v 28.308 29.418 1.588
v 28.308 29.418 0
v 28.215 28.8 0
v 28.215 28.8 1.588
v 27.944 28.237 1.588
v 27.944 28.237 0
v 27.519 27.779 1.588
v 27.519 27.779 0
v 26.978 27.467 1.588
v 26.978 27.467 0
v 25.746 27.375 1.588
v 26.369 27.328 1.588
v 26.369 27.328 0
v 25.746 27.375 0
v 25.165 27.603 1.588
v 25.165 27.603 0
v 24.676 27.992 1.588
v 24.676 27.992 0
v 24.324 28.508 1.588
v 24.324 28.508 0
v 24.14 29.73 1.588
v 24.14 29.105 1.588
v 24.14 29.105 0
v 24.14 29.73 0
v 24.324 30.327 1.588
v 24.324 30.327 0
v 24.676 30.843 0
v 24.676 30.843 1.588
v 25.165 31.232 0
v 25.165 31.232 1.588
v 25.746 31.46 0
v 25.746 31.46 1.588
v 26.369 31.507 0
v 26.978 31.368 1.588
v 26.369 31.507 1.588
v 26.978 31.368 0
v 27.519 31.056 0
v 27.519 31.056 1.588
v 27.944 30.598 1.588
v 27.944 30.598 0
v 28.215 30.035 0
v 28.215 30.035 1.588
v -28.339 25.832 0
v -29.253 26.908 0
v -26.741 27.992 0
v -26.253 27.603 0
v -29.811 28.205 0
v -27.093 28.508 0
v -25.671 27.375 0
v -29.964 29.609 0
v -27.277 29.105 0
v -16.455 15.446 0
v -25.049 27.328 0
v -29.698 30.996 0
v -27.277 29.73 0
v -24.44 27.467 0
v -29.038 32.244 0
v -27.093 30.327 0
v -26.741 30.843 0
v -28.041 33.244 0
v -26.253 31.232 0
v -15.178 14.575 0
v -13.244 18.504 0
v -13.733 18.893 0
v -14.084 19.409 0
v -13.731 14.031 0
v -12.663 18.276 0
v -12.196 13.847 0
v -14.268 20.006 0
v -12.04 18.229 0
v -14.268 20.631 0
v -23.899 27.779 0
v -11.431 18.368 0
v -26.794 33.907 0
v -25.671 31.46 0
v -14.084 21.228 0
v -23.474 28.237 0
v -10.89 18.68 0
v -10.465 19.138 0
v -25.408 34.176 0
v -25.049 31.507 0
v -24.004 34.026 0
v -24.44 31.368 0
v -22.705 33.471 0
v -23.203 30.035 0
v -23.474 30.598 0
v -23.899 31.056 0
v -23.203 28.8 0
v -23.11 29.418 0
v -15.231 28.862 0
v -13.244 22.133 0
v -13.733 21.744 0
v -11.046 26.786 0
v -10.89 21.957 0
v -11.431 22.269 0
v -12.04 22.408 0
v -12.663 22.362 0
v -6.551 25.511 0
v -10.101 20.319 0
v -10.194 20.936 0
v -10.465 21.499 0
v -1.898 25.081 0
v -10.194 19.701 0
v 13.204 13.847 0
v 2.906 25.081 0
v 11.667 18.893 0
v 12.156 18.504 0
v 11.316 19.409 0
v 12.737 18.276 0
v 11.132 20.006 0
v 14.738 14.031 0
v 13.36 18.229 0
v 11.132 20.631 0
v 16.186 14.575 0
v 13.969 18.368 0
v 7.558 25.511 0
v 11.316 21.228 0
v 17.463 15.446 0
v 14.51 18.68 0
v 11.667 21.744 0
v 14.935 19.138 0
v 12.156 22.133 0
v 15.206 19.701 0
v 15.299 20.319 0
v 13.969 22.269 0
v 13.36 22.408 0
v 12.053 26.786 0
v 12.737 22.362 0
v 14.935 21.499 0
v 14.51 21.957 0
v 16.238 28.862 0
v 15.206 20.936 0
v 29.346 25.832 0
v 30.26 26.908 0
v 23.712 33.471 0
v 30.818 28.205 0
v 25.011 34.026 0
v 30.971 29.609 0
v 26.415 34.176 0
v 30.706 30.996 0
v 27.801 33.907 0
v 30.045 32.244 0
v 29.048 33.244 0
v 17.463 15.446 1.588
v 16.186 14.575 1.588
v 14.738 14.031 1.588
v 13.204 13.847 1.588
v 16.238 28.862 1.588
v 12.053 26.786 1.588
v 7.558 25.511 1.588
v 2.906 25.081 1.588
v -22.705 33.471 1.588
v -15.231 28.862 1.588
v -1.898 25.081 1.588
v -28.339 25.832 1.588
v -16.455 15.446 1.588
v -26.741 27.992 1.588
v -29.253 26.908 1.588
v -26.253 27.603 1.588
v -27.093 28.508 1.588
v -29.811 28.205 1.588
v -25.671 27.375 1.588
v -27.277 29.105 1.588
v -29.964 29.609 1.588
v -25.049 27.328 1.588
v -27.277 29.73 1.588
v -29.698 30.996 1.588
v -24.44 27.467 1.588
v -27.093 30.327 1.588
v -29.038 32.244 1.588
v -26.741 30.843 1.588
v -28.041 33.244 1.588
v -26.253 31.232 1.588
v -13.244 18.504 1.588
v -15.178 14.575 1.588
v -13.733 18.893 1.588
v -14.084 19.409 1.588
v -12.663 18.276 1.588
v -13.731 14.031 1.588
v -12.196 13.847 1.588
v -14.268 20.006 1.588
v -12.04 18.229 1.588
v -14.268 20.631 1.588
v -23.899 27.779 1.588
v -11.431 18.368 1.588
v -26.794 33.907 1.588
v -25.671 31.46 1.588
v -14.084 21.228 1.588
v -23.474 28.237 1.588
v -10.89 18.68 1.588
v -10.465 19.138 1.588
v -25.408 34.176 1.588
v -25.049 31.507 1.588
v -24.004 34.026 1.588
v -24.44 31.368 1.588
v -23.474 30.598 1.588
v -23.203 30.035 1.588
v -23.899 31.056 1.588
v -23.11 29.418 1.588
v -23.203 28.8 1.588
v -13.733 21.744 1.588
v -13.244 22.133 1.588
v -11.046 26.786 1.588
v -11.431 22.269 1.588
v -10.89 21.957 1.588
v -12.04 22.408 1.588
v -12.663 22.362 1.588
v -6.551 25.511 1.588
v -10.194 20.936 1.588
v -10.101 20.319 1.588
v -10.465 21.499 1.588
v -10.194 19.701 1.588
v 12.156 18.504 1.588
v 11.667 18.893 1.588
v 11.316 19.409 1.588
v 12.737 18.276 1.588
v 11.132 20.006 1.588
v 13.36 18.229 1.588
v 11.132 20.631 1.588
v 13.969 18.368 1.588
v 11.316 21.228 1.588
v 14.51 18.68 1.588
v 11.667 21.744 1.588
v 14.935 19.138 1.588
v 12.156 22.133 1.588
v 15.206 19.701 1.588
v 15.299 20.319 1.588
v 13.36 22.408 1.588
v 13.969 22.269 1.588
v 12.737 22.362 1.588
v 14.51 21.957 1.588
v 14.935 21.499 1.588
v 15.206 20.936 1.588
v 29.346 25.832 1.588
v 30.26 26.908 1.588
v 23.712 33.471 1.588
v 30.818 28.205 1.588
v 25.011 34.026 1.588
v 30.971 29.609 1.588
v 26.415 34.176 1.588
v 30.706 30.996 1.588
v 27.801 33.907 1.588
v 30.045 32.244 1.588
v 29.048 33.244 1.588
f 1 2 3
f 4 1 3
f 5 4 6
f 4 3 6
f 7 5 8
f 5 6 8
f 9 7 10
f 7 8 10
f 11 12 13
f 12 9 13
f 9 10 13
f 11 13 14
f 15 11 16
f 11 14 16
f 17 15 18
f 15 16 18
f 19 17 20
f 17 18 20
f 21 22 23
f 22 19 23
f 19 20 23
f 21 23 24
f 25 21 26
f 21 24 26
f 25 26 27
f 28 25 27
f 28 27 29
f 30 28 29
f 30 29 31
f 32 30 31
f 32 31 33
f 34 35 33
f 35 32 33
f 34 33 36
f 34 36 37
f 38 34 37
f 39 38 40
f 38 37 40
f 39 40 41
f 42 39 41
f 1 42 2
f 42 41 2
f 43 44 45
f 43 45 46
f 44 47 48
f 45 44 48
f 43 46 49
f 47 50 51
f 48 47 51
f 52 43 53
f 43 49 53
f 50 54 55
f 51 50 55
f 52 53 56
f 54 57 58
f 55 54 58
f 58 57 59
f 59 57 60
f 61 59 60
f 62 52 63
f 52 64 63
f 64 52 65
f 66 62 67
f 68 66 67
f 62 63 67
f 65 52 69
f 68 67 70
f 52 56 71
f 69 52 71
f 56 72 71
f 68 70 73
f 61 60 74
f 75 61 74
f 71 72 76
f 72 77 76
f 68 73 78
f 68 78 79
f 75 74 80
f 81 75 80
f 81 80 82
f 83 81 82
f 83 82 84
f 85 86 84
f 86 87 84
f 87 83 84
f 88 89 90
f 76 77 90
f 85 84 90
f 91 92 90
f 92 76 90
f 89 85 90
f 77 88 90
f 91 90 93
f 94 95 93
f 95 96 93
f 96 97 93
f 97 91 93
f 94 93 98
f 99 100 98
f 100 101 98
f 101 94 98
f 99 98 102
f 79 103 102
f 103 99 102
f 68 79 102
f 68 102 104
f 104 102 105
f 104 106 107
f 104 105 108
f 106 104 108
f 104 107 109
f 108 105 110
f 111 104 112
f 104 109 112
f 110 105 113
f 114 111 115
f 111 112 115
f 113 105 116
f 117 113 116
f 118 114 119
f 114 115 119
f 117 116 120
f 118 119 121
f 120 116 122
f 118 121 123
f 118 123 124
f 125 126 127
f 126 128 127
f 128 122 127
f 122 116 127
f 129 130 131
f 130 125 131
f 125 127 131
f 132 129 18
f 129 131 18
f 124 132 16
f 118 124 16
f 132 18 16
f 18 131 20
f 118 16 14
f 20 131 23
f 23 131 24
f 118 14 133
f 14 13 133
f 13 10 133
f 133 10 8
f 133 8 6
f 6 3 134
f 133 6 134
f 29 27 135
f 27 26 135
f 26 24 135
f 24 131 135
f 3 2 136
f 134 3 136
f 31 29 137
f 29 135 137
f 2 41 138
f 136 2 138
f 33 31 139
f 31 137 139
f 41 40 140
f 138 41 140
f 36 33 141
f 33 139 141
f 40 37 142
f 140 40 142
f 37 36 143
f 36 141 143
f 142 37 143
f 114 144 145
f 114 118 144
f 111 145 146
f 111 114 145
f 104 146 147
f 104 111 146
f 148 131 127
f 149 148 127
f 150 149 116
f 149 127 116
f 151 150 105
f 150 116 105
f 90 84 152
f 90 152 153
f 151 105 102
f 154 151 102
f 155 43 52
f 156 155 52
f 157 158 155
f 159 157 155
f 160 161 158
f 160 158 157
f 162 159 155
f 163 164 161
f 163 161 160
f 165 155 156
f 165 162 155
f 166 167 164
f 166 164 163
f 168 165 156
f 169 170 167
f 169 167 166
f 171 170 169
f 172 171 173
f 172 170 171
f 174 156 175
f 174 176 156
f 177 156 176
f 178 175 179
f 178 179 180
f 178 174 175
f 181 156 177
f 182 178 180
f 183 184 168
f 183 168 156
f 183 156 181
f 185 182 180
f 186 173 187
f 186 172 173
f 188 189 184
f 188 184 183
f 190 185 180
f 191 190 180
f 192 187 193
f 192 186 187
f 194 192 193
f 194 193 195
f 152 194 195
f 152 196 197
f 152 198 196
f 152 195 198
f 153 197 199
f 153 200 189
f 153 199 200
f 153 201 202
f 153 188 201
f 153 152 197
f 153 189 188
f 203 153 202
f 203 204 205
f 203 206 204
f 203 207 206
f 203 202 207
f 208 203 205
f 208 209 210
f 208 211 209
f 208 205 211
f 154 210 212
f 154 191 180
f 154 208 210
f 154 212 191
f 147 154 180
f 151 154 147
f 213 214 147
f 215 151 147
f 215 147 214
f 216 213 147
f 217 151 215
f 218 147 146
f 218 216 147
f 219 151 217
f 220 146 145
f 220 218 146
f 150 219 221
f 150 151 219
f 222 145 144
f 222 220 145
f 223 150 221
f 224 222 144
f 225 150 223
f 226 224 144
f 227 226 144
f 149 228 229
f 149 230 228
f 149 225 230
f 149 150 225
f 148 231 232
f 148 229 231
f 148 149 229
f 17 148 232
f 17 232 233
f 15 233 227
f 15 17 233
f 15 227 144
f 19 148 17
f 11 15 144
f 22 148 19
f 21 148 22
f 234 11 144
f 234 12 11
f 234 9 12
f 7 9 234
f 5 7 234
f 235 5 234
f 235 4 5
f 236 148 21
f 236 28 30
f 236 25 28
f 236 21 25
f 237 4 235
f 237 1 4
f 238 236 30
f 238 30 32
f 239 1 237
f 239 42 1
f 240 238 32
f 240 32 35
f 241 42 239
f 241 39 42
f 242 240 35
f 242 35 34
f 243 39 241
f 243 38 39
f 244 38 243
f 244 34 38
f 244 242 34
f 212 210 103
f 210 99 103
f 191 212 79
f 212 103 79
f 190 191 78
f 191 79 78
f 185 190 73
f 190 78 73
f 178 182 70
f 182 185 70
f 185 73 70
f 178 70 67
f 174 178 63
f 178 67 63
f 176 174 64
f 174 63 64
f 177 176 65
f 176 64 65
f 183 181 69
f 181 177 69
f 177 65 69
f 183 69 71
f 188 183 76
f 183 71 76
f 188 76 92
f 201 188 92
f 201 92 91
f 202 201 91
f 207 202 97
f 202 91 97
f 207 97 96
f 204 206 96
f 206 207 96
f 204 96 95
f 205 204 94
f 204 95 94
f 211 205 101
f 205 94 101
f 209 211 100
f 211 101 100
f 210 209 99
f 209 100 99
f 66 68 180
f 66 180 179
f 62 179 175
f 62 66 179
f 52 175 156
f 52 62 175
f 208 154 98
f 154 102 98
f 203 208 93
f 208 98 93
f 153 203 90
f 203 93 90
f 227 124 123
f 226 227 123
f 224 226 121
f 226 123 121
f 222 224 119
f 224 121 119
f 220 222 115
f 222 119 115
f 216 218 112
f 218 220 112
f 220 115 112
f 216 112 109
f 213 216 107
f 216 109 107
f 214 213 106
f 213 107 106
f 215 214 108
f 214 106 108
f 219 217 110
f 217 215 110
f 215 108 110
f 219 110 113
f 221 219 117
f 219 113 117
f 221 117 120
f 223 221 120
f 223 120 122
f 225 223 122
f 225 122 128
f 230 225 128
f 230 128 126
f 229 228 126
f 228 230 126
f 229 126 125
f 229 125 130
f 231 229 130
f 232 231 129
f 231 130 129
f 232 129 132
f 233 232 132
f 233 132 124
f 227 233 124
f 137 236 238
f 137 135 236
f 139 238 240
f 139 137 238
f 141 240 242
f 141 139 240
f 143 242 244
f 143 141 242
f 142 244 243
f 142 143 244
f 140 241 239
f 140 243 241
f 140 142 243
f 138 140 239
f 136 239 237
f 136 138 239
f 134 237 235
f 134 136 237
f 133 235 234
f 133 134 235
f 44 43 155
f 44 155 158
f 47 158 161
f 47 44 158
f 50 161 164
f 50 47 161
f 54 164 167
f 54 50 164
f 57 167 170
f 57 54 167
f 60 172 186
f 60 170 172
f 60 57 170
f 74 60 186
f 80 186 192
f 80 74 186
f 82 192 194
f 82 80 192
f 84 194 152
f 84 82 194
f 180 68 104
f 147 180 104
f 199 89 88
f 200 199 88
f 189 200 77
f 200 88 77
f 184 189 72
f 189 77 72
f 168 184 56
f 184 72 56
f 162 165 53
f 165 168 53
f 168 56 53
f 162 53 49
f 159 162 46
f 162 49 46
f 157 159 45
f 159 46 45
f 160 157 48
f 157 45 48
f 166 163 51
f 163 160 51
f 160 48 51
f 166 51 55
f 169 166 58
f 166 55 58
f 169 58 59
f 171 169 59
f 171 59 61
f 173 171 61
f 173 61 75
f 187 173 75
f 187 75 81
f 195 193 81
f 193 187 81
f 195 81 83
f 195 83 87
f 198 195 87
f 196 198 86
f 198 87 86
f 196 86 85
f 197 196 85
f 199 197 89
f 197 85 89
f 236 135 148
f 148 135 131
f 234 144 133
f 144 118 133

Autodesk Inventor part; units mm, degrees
ref_plane "YZ Plane" through (0, 0, 0) normal (1, 0, 0) x (0, 1, 0)
ref_plane "XZ Plane" through (0, 0, 0) normal (0, 1, 0) x (-1, 0, 0)
ref_plane "XY Plane" through (0, 0, 0) normal (0, 0, 1) x (1, 0, 0)
sketch "Sketch1" plane through (0, 0, 0) normal (0, 0, 1) x (1, 0, 0)
  circle A0 centre (13.2036, 20.3187) radius 2.0955
  circle A1 centre (-12.1964, 20.3187) radius 2.0955
  line L0 (2.9057, 25.0812) -> (-1.8984, 25.0812)
  circle A2 centre (-25.2051, 29.4175) radius 2.0955
  arc A3 (-22.7052, 33.4711) -> (-28.3391, 25.8315) centre (-25.2051, 29.4175) ccw
  arc A4 (29.3464, 25.8315) -> (23.7125, 33.4711) centre (26.2124, 29.4175) ccw
  circle A5 centre (26.2124, 29.4175) radius 2.0955
  line L1 (-22.7052, 33.4711) -> (-15.2312, 28.8619)
  line L2 (23.7125, 33.4711) -> (16.2385, 28.8619)
  arc A6 (-15.2312, 28.8619) -> (-1.8984, 25.0812) centre (-1.8984, 50.4812) ccw
  arc A7 (2.9057, 25.0812) -> (16.2385, 28.8619) centre (2.9057, 50.4812) ccw
  arc A8 (-16.4554, 15.4455) -> (-12.1964, 13.8467) centre (-12.1964, 20.3187) ccw
  arc A9 (13.2036, 13.8467) -> (17.4626, 15.4455) centre (13.2036, 20.3187) ccw
  line L3 (-12.1964, 13.8467) -> (13.2036, 13.8467)
  line L4 (-28.3391, 25.8315) -> (-16.4554, 15.4455)
  line L5 (17.4626, 15.4455) -> (29.3464, 25.8315)
  circle A10 centre (-12.1964, 20.3187) radius 3.6662
  circle A11 centre (13.2036, 20.3187) radius 3.6662
  point P0 (0, 0)
  point P1 (-12.1964, 25.0812)
  point P2 (17.4758, 18.214)
  point P3 (-16.4686, 18.214)
  point P4 (0.5036, 25.0812)
  dimension "d8" = 4.191
  dimension "d9" = 4.191
  dimension "d13" = 4.191
  dimension "d14" = 9.525
  dimension "d15" = 9.525
  dimension "d16" = 4.191
  dimension "d17" = 25.4
  dimension "d19" = 7.3323
  dimension "d21" = 15.875
  dimension "d23" = 15.875
extrude "Extrusion1" add sketch "Sketch1" along normal blind 1.5875 contours A7 L2 A4 L5 A9 L3 A8 L4 A3 L1 A6 L0 | A10 | A11
properties part number "Hook Gusset Brace" material "Acetal Resin, White"
